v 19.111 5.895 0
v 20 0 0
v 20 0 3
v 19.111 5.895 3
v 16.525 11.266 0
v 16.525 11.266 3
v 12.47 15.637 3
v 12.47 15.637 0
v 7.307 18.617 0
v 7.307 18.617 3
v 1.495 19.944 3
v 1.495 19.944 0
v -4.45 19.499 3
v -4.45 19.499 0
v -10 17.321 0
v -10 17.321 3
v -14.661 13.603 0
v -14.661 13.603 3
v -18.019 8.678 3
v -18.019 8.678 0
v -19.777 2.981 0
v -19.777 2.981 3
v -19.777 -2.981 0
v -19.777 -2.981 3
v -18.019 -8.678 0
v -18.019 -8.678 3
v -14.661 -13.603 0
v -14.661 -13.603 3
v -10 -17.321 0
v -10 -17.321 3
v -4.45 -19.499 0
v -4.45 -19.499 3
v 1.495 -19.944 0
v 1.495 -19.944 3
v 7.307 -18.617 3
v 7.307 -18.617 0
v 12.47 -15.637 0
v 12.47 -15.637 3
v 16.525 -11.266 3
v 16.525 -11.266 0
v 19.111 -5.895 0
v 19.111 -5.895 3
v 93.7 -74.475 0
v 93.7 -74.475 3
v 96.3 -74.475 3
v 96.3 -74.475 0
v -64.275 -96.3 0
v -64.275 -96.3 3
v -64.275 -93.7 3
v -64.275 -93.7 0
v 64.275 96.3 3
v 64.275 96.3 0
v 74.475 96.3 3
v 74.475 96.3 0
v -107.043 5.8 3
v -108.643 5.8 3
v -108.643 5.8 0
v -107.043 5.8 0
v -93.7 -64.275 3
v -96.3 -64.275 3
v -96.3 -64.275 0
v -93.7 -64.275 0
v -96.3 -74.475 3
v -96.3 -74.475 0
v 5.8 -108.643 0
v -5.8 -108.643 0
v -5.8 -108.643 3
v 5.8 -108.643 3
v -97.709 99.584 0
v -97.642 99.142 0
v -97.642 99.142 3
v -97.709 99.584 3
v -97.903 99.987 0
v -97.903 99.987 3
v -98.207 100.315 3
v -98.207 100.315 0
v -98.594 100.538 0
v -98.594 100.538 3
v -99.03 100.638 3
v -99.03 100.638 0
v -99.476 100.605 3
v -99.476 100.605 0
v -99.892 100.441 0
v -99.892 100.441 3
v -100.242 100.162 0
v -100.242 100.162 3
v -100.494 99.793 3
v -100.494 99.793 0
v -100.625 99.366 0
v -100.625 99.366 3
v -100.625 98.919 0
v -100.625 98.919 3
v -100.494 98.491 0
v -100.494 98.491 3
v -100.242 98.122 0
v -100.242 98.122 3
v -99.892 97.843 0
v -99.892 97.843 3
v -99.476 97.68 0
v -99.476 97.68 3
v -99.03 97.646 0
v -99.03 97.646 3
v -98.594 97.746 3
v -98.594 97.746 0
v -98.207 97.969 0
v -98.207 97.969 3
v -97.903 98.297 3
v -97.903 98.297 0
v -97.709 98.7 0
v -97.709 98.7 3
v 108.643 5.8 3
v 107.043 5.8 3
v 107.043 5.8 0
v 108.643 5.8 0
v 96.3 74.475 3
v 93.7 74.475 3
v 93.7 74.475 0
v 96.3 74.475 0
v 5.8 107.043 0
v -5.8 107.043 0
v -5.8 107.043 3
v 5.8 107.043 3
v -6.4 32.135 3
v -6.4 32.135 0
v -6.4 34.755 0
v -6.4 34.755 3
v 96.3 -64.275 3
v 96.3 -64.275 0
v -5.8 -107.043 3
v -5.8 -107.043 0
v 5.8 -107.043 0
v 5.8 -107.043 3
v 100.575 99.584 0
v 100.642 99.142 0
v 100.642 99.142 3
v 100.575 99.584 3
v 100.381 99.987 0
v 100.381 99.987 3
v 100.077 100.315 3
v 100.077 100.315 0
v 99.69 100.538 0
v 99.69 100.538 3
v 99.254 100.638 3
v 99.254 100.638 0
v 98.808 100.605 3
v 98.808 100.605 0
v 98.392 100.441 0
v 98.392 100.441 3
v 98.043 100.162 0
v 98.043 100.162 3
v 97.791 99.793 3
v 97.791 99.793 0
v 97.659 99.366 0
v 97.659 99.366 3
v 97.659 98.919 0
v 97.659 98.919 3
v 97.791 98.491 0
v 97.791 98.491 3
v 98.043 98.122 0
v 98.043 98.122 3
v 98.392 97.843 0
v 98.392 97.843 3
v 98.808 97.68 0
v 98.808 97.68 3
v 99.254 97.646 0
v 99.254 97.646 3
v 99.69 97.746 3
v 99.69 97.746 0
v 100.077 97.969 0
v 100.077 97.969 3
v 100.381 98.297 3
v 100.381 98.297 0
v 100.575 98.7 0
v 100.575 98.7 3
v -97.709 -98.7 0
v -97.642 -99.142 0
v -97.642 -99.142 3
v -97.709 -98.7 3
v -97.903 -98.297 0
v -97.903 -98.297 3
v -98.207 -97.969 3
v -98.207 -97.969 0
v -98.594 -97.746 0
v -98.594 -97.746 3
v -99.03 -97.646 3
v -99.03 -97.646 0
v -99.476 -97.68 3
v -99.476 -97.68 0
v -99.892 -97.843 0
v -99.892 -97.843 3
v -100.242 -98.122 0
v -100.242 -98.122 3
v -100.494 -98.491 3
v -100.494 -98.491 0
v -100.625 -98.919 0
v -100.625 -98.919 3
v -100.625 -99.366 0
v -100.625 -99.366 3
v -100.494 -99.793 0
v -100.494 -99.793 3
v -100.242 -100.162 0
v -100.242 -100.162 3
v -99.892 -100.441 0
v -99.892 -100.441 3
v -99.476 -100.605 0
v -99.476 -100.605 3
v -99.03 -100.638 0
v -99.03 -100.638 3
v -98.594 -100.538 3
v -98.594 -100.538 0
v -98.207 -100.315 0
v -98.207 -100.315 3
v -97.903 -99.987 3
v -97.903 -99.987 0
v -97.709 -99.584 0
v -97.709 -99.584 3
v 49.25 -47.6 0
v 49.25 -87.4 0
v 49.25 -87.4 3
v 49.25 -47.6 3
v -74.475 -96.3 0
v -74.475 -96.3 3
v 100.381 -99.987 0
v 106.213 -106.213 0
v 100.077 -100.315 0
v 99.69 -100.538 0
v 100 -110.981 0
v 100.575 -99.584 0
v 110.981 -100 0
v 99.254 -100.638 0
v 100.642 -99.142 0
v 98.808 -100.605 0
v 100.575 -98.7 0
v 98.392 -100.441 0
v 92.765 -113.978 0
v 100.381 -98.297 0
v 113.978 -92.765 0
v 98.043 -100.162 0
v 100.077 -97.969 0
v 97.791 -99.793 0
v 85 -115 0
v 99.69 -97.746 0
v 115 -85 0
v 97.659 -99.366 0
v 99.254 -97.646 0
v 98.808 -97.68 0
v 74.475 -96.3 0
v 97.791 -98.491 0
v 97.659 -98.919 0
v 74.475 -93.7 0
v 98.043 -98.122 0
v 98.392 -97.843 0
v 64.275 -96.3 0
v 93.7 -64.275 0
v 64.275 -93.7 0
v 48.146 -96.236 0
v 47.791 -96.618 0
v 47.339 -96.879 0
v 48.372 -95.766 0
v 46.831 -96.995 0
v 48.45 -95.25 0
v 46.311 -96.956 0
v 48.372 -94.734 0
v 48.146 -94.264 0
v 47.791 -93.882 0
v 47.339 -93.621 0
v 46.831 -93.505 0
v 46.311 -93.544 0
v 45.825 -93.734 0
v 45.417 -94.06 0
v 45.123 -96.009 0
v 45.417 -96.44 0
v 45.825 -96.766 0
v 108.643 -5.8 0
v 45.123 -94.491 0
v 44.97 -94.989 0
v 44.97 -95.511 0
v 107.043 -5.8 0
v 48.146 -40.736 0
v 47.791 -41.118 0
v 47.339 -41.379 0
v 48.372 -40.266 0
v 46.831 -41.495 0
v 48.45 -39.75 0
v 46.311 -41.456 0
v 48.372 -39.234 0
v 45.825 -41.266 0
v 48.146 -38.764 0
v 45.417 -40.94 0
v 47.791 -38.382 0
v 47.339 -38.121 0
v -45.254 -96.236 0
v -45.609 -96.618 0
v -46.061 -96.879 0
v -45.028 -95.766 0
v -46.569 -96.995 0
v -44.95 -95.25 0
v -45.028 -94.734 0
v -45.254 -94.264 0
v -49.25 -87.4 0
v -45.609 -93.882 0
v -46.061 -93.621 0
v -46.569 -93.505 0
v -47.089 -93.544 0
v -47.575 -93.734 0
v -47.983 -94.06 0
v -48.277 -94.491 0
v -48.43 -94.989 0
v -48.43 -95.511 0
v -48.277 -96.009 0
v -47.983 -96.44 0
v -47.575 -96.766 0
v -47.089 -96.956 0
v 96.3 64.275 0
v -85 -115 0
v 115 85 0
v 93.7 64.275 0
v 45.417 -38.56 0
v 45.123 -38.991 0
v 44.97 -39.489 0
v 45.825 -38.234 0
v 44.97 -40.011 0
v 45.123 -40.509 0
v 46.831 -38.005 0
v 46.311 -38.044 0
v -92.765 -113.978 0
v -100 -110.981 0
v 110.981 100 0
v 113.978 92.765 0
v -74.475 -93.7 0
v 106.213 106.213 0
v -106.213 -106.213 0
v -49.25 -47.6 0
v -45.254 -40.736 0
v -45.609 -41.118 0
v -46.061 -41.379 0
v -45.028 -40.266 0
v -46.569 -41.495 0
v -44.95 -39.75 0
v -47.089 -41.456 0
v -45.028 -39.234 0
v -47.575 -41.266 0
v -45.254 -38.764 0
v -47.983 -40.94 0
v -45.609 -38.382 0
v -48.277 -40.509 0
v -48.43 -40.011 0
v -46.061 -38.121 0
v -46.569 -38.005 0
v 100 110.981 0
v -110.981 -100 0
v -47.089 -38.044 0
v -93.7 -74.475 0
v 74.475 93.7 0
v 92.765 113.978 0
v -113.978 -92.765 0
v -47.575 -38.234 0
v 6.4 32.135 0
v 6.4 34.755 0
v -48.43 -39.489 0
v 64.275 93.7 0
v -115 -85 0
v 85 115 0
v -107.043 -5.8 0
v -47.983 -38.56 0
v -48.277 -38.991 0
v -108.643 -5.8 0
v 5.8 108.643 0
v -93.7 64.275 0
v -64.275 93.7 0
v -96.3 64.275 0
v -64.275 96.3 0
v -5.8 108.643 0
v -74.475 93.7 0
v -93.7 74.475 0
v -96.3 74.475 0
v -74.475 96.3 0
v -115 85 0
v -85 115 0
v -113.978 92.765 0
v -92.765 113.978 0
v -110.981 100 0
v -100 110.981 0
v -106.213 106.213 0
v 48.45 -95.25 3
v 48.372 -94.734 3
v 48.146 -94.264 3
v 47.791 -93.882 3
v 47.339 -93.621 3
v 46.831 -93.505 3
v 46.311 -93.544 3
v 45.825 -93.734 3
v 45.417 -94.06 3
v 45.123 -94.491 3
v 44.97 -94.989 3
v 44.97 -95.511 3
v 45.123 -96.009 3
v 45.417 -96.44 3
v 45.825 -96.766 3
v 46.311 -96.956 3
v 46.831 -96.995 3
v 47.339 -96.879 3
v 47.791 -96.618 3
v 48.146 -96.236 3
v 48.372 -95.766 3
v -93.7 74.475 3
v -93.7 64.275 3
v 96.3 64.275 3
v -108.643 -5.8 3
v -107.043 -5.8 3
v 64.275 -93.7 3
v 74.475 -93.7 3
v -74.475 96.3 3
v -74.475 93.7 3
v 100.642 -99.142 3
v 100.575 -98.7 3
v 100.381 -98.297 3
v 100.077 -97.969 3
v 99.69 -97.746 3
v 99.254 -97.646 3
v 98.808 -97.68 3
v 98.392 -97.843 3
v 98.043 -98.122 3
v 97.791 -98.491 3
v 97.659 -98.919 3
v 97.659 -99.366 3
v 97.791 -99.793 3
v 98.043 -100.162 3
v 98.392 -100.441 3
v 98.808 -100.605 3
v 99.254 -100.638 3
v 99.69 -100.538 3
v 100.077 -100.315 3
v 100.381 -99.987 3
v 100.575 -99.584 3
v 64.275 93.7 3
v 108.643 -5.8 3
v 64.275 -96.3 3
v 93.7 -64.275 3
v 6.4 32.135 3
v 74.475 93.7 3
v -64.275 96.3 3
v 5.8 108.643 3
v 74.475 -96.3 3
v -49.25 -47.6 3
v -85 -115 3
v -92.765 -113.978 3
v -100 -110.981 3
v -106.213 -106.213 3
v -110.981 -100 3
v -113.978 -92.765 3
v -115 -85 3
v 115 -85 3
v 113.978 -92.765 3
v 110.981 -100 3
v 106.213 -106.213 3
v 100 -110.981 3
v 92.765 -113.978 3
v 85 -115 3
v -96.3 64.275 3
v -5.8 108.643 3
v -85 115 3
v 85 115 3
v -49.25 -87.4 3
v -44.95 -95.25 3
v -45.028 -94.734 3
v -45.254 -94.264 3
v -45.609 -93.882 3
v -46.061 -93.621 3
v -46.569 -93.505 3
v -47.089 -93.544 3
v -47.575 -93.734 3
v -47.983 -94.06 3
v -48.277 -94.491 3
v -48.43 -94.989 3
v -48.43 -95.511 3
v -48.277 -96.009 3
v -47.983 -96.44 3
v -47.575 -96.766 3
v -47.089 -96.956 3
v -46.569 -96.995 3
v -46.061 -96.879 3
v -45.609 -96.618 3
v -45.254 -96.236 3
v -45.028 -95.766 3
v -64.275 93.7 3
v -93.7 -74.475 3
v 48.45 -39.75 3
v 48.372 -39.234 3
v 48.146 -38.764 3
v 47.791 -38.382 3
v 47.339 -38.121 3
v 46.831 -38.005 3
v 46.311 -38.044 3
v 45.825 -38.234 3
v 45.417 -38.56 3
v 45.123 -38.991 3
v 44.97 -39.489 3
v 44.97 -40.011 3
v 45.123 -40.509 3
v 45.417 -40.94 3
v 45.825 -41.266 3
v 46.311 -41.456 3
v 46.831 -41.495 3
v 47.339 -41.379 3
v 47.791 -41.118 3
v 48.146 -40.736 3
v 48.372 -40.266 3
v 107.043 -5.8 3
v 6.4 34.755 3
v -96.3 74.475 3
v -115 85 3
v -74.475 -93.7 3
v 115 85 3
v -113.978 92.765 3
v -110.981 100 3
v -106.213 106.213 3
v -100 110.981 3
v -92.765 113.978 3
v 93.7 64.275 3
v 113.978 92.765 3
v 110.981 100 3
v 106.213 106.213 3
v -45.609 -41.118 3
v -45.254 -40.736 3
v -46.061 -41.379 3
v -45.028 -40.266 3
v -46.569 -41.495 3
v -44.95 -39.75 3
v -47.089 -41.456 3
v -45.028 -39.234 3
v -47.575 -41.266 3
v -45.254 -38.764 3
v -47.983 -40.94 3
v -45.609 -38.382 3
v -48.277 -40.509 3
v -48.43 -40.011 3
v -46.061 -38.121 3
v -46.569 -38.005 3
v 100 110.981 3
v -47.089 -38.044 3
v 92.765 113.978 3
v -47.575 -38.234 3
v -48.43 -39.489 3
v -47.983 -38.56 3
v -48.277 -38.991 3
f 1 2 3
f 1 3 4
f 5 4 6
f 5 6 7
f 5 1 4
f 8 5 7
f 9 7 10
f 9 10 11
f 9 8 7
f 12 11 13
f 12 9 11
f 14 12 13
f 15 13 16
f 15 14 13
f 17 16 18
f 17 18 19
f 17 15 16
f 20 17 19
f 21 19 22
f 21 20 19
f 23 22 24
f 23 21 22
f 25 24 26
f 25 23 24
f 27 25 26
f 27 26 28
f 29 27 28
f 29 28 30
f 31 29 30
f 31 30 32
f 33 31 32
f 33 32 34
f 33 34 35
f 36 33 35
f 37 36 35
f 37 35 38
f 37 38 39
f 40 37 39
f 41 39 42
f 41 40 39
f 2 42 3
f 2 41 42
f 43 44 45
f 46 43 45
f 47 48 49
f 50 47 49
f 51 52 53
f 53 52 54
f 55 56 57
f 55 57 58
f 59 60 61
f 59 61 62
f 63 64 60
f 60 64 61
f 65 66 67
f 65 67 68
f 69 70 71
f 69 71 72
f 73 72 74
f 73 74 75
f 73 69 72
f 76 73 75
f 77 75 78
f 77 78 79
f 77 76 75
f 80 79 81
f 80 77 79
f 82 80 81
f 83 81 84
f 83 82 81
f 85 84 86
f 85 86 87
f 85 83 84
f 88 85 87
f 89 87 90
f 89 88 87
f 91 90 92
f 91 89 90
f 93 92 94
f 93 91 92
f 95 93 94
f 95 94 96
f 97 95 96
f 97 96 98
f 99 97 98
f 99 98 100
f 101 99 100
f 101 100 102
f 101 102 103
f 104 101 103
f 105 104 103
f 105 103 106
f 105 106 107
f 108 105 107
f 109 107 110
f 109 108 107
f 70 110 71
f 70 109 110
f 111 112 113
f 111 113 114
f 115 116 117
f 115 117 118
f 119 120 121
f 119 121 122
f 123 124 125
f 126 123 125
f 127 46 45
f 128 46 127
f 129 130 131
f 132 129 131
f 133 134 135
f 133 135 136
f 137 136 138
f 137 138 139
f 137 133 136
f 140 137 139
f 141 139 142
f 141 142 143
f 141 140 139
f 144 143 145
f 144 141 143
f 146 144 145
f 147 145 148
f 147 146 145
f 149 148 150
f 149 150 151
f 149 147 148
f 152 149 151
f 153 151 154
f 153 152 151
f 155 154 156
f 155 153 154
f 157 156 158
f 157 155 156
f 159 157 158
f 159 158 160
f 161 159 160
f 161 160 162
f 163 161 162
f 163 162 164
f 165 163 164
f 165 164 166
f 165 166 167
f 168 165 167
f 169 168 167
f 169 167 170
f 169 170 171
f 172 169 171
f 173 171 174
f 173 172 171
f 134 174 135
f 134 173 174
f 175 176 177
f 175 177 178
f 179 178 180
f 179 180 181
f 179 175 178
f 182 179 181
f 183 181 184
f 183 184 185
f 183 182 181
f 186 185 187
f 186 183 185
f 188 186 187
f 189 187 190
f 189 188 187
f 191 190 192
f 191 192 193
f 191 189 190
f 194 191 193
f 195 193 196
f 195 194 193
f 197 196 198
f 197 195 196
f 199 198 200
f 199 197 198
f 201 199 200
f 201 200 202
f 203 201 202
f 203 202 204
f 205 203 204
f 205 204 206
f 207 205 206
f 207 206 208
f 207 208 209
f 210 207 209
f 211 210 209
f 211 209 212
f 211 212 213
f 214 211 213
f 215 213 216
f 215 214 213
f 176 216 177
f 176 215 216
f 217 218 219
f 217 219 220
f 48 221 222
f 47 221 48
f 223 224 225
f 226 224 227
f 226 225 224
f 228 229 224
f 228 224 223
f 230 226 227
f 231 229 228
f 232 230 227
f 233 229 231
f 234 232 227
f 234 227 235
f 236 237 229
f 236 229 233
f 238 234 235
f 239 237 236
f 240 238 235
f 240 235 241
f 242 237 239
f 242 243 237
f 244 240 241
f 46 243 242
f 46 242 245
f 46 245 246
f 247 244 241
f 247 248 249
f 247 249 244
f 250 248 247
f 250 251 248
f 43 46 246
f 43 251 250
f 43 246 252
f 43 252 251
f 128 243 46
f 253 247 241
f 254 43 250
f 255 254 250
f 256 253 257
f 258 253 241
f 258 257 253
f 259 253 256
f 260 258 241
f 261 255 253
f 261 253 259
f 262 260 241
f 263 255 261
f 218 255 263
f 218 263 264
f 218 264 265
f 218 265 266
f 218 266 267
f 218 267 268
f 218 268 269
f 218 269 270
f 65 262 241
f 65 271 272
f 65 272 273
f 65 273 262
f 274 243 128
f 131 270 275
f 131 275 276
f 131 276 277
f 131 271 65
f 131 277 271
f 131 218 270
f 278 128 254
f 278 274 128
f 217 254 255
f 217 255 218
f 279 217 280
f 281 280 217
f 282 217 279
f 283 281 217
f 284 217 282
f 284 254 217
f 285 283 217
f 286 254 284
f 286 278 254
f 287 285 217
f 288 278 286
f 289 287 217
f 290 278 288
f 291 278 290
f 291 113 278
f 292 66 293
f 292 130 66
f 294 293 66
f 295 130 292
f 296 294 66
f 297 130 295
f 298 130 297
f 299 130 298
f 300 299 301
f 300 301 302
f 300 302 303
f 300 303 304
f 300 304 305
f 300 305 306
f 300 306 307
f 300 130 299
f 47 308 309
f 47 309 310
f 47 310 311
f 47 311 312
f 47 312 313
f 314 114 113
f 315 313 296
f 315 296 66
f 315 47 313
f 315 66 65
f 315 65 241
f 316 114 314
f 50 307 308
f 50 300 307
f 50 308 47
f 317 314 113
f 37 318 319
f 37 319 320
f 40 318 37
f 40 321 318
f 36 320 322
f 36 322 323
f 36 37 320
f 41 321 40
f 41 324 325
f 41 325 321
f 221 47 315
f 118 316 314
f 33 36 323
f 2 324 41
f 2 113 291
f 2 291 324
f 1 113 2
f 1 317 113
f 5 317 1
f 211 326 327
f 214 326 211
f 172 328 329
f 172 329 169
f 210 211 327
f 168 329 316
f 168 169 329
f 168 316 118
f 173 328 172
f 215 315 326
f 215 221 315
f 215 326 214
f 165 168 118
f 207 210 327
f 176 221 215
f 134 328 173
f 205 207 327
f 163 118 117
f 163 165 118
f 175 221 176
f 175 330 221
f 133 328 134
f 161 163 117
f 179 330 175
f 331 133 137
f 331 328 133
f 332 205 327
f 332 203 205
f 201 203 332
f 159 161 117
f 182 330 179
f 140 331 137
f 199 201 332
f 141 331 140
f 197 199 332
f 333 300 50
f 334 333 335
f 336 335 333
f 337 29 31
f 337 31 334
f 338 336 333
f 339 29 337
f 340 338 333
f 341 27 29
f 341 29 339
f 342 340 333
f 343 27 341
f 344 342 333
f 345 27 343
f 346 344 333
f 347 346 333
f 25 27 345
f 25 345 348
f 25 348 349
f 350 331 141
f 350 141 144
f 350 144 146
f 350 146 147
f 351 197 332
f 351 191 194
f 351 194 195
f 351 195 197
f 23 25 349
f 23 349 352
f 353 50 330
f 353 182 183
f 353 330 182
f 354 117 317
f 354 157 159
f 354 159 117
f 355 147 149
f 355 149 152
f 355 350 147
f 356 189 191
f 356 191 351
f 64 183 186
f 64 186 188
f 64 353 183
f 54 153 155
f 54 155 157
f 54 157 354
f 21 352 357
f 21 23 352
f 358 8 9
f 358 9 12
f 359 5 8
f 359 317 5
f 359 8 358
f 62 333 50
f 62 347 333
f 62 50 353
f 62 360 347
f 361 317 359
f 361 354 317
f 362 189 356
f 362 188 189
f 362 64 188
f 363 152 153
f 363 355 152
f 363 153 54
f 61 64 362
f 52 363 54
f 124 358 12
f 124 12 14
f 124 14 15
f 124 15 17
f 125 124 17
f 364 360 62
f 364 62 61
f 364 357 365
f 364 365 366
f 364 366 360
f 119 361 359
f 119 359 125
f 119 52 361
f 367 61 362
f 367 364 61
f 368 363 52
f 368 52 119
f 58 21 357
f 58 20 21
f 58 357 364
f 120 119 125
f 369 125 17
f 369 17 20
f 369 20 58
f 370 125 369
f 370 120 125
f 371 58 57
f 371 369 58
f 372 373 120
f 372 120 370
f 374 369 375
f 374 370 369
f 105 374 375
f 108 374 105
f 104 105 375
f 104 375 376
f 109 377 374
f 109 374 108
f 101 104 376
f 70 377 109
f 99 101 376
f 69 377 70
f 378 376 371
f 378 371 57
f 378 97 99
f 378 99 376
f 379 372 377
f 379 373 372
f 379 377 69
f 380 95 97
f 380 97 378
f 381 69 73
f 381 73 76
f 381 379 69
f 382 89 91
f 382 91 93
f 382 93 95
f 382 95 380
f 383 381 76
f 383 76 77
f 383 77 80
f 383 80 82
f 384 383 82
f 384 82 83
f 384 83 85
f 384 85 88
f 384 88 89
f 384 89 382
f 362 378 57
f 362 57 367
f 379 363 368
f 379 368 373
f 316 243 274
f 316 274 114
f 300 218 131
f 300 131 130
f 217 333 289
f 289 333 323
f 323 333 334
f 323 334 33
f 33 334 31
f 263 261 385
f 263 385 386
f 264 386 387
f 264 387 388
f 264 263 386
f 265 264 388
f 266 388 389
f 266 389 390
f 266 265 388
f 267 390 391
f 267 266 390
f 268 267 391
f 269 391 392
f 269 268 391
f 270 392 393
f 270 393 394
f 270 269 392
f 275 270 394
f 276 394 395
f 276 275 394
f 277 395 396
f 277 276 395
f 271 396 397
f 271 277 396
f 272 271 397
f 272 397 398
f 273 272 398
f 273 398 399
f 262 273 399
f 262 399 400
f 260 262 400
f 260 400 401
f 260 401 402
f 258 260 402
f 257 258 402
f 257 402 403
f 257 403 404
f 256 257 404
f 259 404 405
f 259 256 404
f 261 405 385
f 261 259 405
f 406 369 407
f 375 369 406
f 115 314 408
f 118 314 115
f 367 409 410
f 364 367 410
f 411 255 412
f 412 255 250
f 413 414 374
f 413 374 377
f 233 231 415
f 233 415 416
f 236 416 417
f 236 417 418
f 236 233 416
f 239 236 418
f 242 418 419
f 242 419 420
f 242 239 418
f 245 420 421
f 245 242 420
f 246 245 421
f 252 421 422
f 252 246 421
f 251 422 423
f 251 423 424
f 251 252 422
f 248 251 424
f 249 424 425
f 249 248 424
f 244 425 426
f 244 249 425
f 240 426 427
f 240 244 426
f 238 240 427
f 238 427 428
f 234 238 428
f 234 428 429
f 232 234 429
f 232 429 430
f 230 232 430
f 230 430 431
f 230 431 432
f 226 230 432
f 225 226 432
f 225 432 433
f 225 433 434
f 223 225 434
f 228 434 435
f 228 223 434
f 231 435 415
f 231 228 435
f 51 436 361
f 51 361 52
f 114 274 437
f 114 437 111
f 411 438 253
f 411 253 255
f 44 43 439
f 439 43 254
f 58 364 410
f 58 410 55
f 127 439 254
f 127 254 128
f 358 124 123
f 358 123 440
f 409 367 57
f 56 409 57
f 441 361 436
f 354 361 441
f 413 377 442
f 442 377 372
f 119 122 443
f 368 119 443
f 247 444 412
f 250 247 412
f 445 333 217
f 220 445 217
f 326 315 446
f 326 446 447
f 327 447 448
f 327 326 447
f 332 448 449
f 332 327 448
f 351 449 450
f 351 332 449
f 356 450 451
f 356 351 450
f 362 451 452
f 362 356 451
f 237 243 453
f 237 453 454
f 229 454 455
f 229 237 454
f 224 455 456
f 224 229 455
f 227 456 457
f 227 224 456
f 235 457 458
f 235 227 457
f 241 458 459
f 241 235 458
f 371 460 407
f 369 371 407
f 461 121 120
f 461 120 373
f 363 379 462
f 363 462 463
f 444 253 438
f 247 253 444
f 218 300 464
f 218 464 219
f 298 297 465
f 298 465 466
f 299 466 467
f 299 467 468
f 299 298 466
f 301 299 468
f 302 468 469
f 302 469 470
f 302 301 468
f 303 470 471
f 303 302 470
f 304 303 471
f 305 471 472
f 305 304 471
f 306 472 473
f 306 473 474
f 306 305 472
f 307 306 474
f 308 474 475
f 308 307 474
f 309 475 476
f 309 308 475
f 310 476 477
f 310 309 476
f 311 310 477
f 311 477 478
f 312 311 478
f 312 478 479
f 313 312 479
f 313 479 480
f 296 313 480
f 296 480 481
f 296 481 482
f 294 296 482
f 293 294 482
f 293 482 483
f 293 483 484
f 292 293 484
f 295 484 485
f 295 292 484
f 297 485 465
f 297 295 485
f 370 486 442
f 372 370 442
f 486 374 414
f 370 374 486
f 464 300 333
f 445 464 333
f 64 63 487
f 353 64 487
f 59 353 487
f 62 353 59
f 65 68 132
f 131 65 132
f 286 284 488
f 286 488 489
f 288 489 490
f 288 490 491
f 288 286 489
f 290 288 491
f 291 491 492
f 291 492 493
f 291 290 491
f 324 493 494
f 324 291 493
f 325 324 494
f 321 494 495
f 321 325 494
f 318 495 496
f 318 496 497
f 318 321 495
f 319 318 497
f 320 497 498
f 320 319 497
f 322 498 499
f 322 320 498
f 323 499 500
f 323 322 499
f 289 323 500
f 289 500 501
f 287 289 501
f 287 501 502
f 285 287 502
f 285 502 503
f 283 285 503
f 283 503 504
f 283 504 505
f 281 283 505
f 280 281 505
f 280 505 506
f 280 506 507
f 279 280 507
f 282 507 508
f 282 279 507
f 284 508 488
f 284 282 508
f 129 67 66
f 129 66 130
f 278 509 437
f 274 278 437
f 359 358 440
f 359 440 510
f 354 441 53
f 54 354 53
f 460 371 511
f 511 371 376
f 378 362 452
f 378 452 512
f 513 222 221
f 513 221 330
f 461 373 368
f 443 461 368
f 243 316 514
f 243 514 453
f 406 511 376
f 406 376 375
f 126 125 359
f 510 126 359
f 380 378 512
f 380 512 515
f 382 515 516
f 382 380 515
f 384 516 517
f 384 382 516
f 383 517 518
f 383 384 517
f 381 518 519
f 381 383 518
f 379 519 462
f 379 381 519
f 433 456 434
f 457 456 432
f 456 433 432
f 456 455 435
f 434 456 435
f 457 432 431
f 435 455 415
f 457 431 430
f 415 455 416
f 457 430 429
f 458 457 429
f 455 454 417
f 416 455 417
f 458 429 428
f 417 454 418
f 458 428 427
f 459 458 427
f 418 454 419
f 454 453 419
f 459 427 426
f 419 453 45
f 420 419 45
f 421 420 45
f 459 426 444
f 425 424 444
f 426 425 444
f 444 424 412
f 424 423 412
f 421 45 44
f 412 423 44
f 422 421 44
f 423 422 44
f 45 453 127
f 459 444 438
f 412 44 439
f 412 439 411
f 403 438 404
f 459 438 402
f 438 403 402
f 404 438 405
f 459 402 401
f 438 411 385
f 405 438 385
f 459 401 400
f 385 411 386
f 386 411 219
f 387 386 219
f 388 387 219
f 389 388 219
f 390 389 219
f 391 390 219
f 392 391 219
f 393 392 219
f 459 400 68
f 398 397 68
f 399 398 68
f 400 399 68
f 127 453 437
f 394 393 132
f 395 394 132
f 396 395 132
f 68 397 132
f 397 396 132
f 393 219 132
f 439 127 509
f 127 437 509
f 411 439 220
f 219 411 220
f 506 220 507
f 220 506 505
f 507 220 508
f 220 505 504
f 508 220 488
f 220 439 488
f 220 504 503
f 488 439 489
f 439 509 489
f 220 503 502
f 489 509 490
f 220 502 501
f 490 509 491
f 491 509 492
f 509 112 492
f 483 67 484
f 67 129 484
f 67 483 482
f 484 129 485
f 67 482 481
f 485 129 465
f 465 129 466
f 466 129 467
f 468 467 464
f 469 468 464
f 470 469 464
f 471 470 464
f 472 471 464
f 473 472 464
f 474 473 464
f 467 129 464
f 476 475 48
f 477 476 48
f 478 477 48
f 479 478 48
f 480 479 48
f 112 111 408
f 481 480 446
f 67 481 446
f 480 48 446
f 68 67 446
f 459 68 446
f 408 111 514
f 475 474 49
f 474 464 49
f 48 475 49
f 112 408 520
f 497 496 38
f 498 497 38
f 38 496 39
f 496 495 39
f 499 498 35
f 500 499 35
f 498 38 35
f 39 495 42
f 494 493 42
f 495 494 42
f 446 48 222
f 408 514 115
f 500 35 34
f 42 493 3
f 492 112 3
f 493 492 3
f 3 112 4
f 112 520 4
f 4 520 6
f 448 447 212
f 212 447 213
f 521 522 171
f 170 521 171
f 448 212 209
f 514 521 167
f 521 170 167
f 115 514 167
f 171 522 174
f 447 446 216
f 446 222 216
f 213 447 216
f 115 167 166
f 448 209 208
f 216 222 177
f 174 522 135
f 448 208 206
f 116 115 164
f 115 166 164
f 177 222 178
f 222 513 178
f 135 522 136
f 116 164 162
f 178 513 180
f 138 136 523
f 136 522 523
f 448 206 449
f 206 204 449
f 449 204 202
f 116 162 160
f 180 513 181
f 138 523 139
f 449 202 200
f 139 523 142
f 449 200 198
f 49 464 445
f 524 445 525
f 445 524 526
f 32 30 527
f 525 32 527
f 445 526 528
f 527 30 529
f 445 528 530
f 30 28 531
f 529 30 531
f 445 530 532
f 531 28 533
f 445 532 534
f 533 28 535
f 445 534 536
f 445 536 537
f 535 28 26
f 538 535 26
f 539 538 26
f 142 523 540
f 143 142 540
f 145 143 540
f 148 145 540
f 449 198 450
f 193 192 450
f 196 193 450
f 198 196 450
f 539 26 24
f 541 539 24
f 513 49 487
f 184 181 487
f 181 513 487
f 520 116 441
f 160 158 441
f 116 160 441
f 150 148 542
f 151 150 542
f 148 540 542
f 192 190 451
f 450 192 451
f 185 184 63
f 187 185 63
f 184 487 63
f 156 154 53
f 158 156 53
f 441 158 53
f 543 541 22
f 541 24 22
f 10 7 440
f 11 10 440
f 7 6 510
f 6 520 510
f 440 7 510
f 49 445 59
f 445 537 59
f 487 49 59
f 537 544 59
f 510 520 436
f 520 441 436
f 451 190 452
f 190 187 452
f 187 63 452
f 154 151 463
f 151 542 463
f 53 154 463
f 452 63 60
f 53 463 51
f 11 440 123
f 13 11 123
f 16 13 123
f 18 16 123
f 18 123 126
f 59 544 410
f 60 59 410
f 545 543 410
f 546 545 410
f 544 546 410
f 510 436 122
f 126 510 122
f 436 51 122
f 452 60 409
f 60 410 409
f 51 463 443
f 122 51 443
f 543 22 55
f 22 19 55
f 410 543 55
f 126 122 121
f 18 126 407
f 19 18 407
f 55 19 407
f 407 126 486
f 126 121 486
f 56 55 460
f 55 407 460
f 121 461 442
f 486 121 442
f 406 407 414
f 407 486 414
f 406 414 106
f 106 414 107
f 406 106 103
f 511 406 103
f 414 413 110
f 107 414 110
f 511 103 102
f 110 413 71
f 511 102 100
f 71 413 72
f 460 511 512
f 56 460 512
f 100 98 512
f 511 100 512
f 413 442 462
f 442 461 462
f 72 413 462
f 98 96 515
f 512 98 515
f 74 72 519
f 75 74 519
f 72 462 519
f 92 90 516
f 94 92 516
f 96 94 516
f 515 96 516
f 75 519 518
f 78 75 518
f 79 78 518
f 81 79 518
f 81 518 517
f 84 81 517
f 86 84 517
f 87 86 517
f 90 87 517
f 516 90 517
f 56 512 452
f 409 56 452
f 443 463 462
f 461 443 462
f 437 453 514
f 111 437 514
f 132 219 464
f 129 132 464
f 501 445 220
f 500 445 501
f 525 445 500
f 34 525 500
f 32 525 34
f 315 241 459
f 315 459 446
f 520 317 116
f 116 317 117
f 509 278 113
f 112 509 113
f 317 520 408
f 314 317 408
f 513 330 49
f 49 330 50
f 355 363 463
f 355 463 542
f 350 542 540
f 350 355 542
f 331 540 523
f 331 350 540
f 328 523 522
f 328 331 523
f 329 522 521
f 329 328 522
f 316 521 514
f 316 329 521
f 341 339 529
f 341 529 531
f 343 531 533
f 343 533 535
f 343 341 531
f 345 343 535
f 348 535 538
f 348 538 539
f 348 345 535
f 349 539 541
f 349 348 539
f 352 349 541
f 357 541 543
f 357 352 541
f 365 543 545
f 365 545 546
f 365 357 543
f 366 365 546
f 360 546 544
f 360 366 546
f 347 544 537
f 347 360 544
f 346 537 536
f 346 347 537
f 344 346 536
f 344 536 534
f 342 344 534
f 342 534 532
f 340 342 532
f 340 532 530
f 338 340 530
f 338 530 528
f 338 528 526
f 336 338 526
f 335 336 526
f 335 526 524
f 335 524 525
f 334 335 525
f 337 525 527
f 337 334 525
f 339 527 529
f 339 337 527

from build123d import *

# Parameters (mm, degrees)
CROQUIS1_R              = 1.5
CROQUIS1_R_2            = 1.75
CROQUIS1_R_3            = 20
CROQUIS1_W              = 98.5
CROQUIS1_H              = 39.8
CROQUIS1_W_2            = 10.2
CROQUIS1_H_2            = 2.6
CROQUIS1_W_3            = 2.6
CROQUIS1_H_3            = 10.2
CROQUIS1_W_4            = 1.6
CROQUIS1_H_4            = 11.6
CROQUIS1_W_5            = 12.8
CROQUIS1_H_5            = 2.62
CROQUIS1_W_6            = 11.6
CROQUIS1_H_6            = 1.6
SALIENTE_EXTRUIR1_DEPTH = 3


with BuildPart() as part:
    # Croquis1 → Saliente-Extruir1 (new body)
    with BuildSketch(Plane.XY):
        with BuildLine():
            Line((85, -115), (-85, -115))
            ThreePointArc((-85, -115), (-106.213203436, -106.213203436), (-115, -85))
            Line((-115, -85), (-115, 85))
            ThreePointArc((-115, 85), (-106.213203436, 106.213203436), (-85, 115))
            Line((-85, 115), (85, 115))
            ThreePointArc((85, 115), (106.213203436, 106.213203436), (115, 85))
            Line((115, 85), (115, -85))
            ThreePointArc((115, -85), (106.213203436, -106.213203436), (85, -115))
        make_face()
        with Locations((-99.142135624, 99.142135624)):
            Circle(CROQUIS1_R, mode=Mode.SUBTRACT)
        with Locations((-99.142135624, -99.142135624)):
            Circle(CROQUIS1_R, mode=Mode.SUBTRACT)
        with Locations((99.142135624, 99.142135624)):
            Circle(CROQUIS1_R, mode=Mode.SUBTRACT)
        with Locations((99.142135624, -99.142135624)):
            Circle(CROQUIS1_R, mode=Mode.SUBTRACT)
        with Locations((46.7, -39.75)):
            Circle(CROQUIS1_R_2, mode=Mode.SUBTRACT)
        with Locations((-46.7, -39.75)):
            Circle(CROQUIS1_R_2, mode=Mode.SUBTRACT)
        with Locations((46.7, -95.25)):
            Circle(CROQUIS1_R_2, mode=Mode.SUBTRACT)
        with Locations((-46.7, -95.25)):
            Circle(CROQUIS1_R_2, mode=Mode.SUBTRACT)
        Circle(CROQUIS1_R_3, mode=Mode.SUBTRACT)
        with Locations((0, -67.5)):
            Rectangle(CROQUIS1_W, CROQUIS1_H, mode=Mode.SUBTRACT)
        with Locations((69.375, 95)):
            Rectangle(CROQUIS1_W_2, CROQUIS1_H_2, mode=Mode.SUBTRACT)
        with Locations((69.375, -95)):
            Rectangle(CROQUIS1_W_2, CROQUIS1_H_2, mode=Mode.SUBTRACT)
        with Locations((-69.375, -95)):
            Rectangle(CROQUIS1_W_2, CROQUIS1_H_2, mode=Mode.SUBTRACT)
        with Locations((-69.375, 95)):
            Rectangle(CROQUIS1_W_2, CROQUIS1_H_2, mode=Mode.SUBTRACT)
        with Locations((-95, -69.375)):
            Rectangle(CROQUIS1_W_3, CROQUIS1_H_3, mode=Mode.SUBTRACT)
        with Locations((-95, 69.375)):
            Rectangle(CROQUIS1_W_3, CROQUIS1_H_3, mode=Mode.SUBTRACT)
        with Locations((95, -69.375)):
            Rectangle(CROQUIS1_W_3, CROQUIS1_H_3, mode=Mode.SUBTRACT)
        with Locations((95, 69.375)):
            Rectangle(CROQUIS1_W_3, CROQUIS1_H_3, mode=Mode.SUBTRACT)
        with Locations((107.843441478, 0)):
            Rectangle(CROQUIS1_W_4, CROQUIS1_H_4, mode=Mode.SUBTRACT)
        with Locations((0, 33.445401683)):
            Rectangle(CROQUIS1_W_5, CROQUIS1_H_5, mode=Mode.SUBTRACT)
        with Locations((-107.843441478, 0)):
            Rectangle(CROQUIS1_W_4, CROQUIS1_H_4, mode=Mode.SUBTRACT)
        with Locations((0, 107.843441478)):
            Rectangle(CROQUIS1_W_6, CROQUIS1_H_6, mode=Mode.SUBTRACT)
        with Locations((0, -107.843441478)):
            Rectangle(CROQUIS1_W_6, CROQUIS1_H_6, mode=Mode.SUBTRACT)
    extrude(amount=SALIENTE_EXTRUIR1_DEPTH)


solid = part.part
